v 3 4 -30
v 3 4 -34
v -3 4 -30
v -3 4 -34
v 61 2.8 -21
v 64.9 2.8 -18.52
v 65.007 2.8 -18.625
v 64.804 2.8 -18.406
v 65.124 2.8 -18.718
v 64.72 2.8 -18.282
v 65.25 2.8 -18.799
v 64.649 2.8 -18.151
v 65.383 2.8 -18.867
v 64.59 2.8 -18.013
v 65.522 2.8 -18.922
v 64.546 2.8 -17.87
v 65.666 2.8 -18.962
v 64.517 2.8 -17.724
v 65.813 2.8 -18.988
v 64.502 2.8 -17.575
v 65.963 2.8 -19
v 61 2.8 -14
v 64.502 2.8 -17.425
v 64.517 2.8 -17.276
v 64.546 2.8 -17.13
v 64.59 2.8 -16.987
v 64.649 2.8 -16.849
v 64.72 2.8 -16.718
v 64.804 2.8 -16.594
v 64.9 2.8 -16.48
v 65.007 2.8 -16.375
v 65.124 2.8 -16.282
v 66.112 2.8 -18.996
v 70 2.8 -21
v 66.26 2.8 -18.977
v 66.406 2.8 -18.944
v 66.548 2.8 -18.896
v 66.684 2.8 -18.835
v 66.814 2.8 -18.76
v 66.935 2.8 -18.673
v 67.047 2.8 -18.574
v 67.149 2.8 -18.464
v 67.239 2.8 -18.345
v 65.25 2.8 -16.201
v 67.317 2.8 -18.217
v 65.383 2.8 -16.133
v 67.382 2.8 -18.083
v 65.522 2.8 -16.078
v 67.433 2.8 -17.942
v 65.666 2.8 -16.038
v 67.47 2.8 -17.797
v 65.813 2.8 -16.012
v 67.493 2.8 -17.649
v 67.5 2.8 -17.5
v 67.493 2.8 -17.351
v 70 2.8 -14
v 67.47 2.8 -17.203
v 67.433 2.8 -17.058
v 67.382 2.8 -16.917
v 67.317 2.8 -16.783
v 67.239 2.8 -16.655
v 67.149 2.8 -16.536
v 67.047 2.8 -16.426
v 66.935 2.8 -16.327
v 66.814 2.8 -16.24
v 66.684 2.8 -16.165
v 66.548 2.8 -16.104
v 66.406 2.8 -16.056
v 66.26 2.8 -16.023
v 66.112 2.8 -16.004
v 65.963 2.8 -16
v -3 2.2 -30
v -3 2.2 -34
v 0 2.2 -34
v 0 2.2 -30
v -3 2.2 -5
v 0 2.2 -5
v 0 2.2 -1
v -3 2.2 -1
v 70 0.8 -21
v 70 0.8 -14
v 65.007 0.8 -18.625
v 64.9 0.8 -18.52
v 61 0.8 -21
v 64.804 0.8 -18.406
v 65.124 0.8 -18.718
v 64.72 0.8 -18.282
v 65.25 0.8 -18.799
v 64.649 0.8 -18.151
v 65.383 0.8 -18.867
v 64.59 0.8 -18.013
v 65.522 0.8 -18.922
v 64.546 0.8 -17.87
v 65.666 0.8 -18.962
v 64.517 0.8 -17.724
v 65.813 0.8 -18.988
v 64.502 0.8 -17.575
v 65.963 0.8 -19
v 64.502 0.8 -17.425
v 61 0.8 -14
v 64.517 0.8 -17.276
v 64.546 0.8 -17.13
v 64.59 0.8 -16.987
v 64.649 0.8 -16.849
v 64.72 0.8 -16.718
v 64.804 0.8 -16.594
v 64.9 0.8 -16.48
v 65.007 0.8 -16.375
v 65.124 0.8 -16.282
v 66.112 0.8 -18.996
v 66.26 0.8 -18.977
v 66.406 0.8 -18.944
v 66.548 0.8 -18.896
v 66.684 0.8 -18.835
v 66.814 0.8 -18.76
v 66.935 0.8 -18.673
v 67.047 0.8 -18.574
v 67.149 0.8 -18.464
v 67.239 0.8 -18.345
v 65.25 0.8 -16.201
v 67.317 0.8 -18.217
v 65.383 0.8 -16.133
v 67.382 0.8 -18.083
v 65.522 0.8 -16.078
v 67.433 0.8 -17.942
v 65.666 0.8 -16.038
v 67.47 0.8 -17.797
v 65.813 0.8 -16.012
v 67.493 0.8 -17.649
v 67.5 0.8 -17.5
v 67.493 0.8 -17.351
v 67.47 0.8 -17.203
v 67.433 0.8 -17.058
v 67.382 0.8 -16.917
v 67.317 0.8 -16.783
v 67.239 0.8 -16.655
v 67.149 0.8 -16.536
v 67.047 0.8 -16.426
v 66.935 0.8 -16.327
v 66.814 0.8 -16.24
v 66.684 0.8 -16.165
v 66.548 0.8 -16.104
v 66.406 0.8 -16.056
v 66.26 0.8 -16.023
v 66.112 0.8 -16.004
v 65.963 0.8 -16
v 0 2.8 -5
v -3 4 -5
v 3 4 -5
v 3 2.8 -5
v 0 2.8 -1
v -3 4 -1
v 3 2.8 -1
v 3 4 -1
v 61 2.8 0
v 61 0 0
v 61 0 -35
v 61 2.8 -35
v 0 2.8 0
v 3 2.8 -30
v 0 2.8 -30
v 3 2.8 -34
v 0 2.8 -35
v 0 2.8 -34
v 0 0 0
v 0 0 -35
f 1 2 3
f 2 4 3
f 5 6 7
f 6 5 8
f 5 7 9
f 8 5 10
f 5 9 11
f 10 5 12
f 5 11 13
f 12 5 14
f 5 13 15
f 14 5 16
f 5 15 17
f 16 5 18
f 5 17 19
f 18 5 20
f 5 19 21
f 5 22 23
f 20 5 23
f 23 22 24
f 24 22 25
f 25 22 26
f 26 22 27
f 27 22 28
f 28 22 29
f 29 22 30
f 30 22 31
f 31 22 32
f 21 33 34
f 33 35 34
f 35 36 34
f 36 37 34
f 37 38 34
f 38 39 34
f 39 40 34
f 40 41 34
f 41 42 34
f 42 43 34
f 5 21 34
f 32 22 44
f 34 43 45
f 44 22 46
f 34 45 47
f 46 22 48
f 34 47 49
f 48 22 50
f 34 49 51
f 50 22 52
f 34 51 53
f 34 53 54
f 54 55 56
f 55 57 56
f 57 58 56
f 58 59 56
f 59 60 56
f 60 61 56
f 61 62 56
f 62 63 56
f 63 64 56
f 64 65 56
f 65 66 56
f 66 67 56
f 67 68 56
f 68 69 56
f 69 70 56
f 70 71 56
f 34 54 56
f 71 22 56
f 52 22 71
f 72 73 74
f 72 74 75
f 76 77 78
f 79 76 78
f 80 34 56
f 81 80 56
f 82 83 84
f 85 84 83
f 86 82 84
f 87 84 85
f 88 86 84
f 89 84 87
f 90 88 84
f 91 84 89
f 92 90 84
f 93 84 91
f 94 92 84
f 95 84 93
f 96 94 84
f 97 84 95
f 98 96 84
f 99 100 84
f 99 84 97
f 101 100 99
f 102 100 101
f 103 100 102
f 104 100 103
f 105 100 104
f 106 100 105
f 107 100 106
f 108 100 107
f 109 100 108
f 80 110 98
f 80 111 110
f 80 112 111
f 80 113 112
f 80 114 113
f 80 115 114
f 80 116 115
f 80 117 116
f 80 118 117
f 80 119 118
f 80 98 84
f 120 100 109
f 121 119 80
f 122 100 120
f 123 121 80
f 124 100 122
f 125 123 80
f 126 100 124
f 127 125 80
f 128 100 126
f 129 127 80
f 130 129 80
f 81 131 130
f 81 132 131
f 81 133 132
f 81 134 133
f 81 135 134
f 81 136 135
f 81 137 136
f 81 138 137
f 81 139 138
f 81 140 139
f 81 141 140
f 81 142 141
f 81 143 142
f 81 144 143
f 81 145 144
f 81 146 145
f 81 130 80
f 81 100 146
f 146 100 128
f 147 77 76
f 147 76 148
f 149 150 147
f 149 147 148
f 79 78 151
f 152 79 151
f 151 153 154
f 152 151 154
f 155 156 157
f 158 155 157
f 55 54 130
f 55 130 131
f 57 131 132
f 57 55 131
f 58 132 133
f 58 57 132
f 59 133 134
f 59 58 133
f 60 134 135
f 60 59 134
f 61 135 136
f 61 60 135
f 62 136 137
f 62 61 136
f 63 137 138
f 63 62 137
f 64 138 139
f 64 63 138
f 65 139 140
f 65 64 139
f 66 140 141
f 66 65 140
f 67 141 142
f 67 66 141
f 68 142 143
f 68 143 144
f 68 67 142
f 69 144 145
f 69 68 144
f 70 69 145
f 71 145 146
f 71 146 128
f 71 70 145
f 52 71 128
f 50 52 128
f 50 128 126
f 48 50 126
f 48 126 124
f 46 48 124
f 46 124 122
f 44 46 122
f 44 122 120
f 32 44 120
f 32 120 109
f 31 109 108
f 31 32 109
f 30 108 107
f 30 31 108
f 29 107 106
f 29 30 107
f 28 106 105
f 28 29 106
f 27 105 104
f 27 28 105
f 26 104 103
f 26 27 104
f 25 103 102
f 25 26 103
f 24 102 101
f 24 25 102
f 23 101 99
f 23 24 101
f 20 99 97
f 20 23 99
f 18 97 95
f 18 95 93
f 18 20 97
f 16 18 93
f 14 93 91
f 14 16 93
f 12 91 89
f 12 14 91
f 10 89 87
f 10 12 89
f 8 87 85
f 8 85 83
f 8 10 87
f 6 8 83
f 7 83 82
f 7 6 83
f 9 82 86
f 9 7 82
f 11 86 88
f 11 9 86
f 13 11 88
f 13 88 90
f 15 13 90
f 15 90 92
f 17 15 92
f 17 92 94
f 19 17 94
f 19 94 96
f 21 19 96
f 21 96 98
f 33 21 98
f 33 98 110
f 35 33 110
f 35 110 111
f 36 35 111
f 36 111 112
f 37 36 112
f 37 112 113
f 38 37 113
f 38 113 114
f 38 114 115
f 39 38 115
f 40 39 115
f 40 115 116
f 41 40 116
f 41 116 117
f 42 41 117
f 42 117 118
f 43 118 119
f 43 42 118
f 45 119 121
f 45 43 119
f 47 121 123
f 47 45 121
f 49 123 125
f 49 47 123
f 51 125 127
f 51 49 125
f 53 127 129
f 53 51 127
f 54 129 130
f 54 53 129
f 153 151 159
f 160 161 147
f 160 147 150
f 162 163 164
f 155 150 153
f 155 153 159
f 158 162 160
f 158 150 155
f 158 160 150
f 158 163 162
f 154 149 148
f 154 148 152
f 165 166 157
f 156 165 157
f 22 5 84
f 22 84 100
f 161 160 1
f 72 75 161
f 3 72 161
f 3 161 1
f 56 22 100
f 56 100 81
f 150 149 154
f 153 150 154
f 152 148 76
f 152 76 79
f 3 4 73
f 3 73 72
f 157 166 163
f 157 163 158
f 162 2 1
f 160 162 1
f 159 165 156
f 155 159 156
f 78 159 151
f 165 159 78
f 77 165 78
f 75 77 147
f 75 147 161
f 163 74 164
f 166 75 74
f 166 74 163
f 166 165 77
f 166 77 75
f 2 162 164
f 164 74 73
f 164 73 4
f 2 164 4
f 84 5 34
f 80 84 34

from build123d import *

# Parameters (mm, degrees)
SKETCH_1_W      = 61
SKETCH_1_H      = 35
EXTRUDE_1_DEPTH = 2.8
SKETCH_2_W      = 9
SKETCH_2_H      = 7
SKETCH_2_R      = 1.5
EXTRUDE_2_DEPTH = 2
SKETCH_3_W      = 4
SKETCH_3_H      = 1.8
EXTRUDE_3_DEPTH = 3


with BuildPart() as part:
    # 草图1 → 凸台-拉伸1 (new body)
    with BuildSketch(Plane(origin=(0, 0, 0), x_dir=(1, 0, 0), z_dir=(0, 1, 0))):
        with Locations((30.5, 17.5)):
            Rectangle(SKETCH_1_W, SKETCH_1_H)
    extrude(amount=EXTRUDE_1_DEPTH)

    # 草图3 → 凸台-拉伸3 (add, symmetric)
    with BuildSketch(Plane.ZY):
        with Locations((-3, 3.1)):
            Rectangle(SKETCH_3_W, SKETCH_3_H)
        with Locations((-32, 3.1)):
            Rectangle(SKETCH_3_W, SKETCH_3_H)
    extrude(amount=EXTRUDE_3_DEPTH, both=True)


with BuildPart() as body_2:
    # 草图2 → 凸台-拉伸2 (new body)
    with BuildSketch(Plane.XZ.offset(-2.8)):
        with Locations((65.5, -17.5)):
            Rectangle(SKETCH_2_W, SKETCH_2_H)
        with Locations((66, -17.5)):
            Circle(SKETCH_2_R, mode=Mode.SUBTRACT)
    extrude(amount=EXTRUDE_2_DEPTH)


solid = Compound([part.part, body_2.part])
